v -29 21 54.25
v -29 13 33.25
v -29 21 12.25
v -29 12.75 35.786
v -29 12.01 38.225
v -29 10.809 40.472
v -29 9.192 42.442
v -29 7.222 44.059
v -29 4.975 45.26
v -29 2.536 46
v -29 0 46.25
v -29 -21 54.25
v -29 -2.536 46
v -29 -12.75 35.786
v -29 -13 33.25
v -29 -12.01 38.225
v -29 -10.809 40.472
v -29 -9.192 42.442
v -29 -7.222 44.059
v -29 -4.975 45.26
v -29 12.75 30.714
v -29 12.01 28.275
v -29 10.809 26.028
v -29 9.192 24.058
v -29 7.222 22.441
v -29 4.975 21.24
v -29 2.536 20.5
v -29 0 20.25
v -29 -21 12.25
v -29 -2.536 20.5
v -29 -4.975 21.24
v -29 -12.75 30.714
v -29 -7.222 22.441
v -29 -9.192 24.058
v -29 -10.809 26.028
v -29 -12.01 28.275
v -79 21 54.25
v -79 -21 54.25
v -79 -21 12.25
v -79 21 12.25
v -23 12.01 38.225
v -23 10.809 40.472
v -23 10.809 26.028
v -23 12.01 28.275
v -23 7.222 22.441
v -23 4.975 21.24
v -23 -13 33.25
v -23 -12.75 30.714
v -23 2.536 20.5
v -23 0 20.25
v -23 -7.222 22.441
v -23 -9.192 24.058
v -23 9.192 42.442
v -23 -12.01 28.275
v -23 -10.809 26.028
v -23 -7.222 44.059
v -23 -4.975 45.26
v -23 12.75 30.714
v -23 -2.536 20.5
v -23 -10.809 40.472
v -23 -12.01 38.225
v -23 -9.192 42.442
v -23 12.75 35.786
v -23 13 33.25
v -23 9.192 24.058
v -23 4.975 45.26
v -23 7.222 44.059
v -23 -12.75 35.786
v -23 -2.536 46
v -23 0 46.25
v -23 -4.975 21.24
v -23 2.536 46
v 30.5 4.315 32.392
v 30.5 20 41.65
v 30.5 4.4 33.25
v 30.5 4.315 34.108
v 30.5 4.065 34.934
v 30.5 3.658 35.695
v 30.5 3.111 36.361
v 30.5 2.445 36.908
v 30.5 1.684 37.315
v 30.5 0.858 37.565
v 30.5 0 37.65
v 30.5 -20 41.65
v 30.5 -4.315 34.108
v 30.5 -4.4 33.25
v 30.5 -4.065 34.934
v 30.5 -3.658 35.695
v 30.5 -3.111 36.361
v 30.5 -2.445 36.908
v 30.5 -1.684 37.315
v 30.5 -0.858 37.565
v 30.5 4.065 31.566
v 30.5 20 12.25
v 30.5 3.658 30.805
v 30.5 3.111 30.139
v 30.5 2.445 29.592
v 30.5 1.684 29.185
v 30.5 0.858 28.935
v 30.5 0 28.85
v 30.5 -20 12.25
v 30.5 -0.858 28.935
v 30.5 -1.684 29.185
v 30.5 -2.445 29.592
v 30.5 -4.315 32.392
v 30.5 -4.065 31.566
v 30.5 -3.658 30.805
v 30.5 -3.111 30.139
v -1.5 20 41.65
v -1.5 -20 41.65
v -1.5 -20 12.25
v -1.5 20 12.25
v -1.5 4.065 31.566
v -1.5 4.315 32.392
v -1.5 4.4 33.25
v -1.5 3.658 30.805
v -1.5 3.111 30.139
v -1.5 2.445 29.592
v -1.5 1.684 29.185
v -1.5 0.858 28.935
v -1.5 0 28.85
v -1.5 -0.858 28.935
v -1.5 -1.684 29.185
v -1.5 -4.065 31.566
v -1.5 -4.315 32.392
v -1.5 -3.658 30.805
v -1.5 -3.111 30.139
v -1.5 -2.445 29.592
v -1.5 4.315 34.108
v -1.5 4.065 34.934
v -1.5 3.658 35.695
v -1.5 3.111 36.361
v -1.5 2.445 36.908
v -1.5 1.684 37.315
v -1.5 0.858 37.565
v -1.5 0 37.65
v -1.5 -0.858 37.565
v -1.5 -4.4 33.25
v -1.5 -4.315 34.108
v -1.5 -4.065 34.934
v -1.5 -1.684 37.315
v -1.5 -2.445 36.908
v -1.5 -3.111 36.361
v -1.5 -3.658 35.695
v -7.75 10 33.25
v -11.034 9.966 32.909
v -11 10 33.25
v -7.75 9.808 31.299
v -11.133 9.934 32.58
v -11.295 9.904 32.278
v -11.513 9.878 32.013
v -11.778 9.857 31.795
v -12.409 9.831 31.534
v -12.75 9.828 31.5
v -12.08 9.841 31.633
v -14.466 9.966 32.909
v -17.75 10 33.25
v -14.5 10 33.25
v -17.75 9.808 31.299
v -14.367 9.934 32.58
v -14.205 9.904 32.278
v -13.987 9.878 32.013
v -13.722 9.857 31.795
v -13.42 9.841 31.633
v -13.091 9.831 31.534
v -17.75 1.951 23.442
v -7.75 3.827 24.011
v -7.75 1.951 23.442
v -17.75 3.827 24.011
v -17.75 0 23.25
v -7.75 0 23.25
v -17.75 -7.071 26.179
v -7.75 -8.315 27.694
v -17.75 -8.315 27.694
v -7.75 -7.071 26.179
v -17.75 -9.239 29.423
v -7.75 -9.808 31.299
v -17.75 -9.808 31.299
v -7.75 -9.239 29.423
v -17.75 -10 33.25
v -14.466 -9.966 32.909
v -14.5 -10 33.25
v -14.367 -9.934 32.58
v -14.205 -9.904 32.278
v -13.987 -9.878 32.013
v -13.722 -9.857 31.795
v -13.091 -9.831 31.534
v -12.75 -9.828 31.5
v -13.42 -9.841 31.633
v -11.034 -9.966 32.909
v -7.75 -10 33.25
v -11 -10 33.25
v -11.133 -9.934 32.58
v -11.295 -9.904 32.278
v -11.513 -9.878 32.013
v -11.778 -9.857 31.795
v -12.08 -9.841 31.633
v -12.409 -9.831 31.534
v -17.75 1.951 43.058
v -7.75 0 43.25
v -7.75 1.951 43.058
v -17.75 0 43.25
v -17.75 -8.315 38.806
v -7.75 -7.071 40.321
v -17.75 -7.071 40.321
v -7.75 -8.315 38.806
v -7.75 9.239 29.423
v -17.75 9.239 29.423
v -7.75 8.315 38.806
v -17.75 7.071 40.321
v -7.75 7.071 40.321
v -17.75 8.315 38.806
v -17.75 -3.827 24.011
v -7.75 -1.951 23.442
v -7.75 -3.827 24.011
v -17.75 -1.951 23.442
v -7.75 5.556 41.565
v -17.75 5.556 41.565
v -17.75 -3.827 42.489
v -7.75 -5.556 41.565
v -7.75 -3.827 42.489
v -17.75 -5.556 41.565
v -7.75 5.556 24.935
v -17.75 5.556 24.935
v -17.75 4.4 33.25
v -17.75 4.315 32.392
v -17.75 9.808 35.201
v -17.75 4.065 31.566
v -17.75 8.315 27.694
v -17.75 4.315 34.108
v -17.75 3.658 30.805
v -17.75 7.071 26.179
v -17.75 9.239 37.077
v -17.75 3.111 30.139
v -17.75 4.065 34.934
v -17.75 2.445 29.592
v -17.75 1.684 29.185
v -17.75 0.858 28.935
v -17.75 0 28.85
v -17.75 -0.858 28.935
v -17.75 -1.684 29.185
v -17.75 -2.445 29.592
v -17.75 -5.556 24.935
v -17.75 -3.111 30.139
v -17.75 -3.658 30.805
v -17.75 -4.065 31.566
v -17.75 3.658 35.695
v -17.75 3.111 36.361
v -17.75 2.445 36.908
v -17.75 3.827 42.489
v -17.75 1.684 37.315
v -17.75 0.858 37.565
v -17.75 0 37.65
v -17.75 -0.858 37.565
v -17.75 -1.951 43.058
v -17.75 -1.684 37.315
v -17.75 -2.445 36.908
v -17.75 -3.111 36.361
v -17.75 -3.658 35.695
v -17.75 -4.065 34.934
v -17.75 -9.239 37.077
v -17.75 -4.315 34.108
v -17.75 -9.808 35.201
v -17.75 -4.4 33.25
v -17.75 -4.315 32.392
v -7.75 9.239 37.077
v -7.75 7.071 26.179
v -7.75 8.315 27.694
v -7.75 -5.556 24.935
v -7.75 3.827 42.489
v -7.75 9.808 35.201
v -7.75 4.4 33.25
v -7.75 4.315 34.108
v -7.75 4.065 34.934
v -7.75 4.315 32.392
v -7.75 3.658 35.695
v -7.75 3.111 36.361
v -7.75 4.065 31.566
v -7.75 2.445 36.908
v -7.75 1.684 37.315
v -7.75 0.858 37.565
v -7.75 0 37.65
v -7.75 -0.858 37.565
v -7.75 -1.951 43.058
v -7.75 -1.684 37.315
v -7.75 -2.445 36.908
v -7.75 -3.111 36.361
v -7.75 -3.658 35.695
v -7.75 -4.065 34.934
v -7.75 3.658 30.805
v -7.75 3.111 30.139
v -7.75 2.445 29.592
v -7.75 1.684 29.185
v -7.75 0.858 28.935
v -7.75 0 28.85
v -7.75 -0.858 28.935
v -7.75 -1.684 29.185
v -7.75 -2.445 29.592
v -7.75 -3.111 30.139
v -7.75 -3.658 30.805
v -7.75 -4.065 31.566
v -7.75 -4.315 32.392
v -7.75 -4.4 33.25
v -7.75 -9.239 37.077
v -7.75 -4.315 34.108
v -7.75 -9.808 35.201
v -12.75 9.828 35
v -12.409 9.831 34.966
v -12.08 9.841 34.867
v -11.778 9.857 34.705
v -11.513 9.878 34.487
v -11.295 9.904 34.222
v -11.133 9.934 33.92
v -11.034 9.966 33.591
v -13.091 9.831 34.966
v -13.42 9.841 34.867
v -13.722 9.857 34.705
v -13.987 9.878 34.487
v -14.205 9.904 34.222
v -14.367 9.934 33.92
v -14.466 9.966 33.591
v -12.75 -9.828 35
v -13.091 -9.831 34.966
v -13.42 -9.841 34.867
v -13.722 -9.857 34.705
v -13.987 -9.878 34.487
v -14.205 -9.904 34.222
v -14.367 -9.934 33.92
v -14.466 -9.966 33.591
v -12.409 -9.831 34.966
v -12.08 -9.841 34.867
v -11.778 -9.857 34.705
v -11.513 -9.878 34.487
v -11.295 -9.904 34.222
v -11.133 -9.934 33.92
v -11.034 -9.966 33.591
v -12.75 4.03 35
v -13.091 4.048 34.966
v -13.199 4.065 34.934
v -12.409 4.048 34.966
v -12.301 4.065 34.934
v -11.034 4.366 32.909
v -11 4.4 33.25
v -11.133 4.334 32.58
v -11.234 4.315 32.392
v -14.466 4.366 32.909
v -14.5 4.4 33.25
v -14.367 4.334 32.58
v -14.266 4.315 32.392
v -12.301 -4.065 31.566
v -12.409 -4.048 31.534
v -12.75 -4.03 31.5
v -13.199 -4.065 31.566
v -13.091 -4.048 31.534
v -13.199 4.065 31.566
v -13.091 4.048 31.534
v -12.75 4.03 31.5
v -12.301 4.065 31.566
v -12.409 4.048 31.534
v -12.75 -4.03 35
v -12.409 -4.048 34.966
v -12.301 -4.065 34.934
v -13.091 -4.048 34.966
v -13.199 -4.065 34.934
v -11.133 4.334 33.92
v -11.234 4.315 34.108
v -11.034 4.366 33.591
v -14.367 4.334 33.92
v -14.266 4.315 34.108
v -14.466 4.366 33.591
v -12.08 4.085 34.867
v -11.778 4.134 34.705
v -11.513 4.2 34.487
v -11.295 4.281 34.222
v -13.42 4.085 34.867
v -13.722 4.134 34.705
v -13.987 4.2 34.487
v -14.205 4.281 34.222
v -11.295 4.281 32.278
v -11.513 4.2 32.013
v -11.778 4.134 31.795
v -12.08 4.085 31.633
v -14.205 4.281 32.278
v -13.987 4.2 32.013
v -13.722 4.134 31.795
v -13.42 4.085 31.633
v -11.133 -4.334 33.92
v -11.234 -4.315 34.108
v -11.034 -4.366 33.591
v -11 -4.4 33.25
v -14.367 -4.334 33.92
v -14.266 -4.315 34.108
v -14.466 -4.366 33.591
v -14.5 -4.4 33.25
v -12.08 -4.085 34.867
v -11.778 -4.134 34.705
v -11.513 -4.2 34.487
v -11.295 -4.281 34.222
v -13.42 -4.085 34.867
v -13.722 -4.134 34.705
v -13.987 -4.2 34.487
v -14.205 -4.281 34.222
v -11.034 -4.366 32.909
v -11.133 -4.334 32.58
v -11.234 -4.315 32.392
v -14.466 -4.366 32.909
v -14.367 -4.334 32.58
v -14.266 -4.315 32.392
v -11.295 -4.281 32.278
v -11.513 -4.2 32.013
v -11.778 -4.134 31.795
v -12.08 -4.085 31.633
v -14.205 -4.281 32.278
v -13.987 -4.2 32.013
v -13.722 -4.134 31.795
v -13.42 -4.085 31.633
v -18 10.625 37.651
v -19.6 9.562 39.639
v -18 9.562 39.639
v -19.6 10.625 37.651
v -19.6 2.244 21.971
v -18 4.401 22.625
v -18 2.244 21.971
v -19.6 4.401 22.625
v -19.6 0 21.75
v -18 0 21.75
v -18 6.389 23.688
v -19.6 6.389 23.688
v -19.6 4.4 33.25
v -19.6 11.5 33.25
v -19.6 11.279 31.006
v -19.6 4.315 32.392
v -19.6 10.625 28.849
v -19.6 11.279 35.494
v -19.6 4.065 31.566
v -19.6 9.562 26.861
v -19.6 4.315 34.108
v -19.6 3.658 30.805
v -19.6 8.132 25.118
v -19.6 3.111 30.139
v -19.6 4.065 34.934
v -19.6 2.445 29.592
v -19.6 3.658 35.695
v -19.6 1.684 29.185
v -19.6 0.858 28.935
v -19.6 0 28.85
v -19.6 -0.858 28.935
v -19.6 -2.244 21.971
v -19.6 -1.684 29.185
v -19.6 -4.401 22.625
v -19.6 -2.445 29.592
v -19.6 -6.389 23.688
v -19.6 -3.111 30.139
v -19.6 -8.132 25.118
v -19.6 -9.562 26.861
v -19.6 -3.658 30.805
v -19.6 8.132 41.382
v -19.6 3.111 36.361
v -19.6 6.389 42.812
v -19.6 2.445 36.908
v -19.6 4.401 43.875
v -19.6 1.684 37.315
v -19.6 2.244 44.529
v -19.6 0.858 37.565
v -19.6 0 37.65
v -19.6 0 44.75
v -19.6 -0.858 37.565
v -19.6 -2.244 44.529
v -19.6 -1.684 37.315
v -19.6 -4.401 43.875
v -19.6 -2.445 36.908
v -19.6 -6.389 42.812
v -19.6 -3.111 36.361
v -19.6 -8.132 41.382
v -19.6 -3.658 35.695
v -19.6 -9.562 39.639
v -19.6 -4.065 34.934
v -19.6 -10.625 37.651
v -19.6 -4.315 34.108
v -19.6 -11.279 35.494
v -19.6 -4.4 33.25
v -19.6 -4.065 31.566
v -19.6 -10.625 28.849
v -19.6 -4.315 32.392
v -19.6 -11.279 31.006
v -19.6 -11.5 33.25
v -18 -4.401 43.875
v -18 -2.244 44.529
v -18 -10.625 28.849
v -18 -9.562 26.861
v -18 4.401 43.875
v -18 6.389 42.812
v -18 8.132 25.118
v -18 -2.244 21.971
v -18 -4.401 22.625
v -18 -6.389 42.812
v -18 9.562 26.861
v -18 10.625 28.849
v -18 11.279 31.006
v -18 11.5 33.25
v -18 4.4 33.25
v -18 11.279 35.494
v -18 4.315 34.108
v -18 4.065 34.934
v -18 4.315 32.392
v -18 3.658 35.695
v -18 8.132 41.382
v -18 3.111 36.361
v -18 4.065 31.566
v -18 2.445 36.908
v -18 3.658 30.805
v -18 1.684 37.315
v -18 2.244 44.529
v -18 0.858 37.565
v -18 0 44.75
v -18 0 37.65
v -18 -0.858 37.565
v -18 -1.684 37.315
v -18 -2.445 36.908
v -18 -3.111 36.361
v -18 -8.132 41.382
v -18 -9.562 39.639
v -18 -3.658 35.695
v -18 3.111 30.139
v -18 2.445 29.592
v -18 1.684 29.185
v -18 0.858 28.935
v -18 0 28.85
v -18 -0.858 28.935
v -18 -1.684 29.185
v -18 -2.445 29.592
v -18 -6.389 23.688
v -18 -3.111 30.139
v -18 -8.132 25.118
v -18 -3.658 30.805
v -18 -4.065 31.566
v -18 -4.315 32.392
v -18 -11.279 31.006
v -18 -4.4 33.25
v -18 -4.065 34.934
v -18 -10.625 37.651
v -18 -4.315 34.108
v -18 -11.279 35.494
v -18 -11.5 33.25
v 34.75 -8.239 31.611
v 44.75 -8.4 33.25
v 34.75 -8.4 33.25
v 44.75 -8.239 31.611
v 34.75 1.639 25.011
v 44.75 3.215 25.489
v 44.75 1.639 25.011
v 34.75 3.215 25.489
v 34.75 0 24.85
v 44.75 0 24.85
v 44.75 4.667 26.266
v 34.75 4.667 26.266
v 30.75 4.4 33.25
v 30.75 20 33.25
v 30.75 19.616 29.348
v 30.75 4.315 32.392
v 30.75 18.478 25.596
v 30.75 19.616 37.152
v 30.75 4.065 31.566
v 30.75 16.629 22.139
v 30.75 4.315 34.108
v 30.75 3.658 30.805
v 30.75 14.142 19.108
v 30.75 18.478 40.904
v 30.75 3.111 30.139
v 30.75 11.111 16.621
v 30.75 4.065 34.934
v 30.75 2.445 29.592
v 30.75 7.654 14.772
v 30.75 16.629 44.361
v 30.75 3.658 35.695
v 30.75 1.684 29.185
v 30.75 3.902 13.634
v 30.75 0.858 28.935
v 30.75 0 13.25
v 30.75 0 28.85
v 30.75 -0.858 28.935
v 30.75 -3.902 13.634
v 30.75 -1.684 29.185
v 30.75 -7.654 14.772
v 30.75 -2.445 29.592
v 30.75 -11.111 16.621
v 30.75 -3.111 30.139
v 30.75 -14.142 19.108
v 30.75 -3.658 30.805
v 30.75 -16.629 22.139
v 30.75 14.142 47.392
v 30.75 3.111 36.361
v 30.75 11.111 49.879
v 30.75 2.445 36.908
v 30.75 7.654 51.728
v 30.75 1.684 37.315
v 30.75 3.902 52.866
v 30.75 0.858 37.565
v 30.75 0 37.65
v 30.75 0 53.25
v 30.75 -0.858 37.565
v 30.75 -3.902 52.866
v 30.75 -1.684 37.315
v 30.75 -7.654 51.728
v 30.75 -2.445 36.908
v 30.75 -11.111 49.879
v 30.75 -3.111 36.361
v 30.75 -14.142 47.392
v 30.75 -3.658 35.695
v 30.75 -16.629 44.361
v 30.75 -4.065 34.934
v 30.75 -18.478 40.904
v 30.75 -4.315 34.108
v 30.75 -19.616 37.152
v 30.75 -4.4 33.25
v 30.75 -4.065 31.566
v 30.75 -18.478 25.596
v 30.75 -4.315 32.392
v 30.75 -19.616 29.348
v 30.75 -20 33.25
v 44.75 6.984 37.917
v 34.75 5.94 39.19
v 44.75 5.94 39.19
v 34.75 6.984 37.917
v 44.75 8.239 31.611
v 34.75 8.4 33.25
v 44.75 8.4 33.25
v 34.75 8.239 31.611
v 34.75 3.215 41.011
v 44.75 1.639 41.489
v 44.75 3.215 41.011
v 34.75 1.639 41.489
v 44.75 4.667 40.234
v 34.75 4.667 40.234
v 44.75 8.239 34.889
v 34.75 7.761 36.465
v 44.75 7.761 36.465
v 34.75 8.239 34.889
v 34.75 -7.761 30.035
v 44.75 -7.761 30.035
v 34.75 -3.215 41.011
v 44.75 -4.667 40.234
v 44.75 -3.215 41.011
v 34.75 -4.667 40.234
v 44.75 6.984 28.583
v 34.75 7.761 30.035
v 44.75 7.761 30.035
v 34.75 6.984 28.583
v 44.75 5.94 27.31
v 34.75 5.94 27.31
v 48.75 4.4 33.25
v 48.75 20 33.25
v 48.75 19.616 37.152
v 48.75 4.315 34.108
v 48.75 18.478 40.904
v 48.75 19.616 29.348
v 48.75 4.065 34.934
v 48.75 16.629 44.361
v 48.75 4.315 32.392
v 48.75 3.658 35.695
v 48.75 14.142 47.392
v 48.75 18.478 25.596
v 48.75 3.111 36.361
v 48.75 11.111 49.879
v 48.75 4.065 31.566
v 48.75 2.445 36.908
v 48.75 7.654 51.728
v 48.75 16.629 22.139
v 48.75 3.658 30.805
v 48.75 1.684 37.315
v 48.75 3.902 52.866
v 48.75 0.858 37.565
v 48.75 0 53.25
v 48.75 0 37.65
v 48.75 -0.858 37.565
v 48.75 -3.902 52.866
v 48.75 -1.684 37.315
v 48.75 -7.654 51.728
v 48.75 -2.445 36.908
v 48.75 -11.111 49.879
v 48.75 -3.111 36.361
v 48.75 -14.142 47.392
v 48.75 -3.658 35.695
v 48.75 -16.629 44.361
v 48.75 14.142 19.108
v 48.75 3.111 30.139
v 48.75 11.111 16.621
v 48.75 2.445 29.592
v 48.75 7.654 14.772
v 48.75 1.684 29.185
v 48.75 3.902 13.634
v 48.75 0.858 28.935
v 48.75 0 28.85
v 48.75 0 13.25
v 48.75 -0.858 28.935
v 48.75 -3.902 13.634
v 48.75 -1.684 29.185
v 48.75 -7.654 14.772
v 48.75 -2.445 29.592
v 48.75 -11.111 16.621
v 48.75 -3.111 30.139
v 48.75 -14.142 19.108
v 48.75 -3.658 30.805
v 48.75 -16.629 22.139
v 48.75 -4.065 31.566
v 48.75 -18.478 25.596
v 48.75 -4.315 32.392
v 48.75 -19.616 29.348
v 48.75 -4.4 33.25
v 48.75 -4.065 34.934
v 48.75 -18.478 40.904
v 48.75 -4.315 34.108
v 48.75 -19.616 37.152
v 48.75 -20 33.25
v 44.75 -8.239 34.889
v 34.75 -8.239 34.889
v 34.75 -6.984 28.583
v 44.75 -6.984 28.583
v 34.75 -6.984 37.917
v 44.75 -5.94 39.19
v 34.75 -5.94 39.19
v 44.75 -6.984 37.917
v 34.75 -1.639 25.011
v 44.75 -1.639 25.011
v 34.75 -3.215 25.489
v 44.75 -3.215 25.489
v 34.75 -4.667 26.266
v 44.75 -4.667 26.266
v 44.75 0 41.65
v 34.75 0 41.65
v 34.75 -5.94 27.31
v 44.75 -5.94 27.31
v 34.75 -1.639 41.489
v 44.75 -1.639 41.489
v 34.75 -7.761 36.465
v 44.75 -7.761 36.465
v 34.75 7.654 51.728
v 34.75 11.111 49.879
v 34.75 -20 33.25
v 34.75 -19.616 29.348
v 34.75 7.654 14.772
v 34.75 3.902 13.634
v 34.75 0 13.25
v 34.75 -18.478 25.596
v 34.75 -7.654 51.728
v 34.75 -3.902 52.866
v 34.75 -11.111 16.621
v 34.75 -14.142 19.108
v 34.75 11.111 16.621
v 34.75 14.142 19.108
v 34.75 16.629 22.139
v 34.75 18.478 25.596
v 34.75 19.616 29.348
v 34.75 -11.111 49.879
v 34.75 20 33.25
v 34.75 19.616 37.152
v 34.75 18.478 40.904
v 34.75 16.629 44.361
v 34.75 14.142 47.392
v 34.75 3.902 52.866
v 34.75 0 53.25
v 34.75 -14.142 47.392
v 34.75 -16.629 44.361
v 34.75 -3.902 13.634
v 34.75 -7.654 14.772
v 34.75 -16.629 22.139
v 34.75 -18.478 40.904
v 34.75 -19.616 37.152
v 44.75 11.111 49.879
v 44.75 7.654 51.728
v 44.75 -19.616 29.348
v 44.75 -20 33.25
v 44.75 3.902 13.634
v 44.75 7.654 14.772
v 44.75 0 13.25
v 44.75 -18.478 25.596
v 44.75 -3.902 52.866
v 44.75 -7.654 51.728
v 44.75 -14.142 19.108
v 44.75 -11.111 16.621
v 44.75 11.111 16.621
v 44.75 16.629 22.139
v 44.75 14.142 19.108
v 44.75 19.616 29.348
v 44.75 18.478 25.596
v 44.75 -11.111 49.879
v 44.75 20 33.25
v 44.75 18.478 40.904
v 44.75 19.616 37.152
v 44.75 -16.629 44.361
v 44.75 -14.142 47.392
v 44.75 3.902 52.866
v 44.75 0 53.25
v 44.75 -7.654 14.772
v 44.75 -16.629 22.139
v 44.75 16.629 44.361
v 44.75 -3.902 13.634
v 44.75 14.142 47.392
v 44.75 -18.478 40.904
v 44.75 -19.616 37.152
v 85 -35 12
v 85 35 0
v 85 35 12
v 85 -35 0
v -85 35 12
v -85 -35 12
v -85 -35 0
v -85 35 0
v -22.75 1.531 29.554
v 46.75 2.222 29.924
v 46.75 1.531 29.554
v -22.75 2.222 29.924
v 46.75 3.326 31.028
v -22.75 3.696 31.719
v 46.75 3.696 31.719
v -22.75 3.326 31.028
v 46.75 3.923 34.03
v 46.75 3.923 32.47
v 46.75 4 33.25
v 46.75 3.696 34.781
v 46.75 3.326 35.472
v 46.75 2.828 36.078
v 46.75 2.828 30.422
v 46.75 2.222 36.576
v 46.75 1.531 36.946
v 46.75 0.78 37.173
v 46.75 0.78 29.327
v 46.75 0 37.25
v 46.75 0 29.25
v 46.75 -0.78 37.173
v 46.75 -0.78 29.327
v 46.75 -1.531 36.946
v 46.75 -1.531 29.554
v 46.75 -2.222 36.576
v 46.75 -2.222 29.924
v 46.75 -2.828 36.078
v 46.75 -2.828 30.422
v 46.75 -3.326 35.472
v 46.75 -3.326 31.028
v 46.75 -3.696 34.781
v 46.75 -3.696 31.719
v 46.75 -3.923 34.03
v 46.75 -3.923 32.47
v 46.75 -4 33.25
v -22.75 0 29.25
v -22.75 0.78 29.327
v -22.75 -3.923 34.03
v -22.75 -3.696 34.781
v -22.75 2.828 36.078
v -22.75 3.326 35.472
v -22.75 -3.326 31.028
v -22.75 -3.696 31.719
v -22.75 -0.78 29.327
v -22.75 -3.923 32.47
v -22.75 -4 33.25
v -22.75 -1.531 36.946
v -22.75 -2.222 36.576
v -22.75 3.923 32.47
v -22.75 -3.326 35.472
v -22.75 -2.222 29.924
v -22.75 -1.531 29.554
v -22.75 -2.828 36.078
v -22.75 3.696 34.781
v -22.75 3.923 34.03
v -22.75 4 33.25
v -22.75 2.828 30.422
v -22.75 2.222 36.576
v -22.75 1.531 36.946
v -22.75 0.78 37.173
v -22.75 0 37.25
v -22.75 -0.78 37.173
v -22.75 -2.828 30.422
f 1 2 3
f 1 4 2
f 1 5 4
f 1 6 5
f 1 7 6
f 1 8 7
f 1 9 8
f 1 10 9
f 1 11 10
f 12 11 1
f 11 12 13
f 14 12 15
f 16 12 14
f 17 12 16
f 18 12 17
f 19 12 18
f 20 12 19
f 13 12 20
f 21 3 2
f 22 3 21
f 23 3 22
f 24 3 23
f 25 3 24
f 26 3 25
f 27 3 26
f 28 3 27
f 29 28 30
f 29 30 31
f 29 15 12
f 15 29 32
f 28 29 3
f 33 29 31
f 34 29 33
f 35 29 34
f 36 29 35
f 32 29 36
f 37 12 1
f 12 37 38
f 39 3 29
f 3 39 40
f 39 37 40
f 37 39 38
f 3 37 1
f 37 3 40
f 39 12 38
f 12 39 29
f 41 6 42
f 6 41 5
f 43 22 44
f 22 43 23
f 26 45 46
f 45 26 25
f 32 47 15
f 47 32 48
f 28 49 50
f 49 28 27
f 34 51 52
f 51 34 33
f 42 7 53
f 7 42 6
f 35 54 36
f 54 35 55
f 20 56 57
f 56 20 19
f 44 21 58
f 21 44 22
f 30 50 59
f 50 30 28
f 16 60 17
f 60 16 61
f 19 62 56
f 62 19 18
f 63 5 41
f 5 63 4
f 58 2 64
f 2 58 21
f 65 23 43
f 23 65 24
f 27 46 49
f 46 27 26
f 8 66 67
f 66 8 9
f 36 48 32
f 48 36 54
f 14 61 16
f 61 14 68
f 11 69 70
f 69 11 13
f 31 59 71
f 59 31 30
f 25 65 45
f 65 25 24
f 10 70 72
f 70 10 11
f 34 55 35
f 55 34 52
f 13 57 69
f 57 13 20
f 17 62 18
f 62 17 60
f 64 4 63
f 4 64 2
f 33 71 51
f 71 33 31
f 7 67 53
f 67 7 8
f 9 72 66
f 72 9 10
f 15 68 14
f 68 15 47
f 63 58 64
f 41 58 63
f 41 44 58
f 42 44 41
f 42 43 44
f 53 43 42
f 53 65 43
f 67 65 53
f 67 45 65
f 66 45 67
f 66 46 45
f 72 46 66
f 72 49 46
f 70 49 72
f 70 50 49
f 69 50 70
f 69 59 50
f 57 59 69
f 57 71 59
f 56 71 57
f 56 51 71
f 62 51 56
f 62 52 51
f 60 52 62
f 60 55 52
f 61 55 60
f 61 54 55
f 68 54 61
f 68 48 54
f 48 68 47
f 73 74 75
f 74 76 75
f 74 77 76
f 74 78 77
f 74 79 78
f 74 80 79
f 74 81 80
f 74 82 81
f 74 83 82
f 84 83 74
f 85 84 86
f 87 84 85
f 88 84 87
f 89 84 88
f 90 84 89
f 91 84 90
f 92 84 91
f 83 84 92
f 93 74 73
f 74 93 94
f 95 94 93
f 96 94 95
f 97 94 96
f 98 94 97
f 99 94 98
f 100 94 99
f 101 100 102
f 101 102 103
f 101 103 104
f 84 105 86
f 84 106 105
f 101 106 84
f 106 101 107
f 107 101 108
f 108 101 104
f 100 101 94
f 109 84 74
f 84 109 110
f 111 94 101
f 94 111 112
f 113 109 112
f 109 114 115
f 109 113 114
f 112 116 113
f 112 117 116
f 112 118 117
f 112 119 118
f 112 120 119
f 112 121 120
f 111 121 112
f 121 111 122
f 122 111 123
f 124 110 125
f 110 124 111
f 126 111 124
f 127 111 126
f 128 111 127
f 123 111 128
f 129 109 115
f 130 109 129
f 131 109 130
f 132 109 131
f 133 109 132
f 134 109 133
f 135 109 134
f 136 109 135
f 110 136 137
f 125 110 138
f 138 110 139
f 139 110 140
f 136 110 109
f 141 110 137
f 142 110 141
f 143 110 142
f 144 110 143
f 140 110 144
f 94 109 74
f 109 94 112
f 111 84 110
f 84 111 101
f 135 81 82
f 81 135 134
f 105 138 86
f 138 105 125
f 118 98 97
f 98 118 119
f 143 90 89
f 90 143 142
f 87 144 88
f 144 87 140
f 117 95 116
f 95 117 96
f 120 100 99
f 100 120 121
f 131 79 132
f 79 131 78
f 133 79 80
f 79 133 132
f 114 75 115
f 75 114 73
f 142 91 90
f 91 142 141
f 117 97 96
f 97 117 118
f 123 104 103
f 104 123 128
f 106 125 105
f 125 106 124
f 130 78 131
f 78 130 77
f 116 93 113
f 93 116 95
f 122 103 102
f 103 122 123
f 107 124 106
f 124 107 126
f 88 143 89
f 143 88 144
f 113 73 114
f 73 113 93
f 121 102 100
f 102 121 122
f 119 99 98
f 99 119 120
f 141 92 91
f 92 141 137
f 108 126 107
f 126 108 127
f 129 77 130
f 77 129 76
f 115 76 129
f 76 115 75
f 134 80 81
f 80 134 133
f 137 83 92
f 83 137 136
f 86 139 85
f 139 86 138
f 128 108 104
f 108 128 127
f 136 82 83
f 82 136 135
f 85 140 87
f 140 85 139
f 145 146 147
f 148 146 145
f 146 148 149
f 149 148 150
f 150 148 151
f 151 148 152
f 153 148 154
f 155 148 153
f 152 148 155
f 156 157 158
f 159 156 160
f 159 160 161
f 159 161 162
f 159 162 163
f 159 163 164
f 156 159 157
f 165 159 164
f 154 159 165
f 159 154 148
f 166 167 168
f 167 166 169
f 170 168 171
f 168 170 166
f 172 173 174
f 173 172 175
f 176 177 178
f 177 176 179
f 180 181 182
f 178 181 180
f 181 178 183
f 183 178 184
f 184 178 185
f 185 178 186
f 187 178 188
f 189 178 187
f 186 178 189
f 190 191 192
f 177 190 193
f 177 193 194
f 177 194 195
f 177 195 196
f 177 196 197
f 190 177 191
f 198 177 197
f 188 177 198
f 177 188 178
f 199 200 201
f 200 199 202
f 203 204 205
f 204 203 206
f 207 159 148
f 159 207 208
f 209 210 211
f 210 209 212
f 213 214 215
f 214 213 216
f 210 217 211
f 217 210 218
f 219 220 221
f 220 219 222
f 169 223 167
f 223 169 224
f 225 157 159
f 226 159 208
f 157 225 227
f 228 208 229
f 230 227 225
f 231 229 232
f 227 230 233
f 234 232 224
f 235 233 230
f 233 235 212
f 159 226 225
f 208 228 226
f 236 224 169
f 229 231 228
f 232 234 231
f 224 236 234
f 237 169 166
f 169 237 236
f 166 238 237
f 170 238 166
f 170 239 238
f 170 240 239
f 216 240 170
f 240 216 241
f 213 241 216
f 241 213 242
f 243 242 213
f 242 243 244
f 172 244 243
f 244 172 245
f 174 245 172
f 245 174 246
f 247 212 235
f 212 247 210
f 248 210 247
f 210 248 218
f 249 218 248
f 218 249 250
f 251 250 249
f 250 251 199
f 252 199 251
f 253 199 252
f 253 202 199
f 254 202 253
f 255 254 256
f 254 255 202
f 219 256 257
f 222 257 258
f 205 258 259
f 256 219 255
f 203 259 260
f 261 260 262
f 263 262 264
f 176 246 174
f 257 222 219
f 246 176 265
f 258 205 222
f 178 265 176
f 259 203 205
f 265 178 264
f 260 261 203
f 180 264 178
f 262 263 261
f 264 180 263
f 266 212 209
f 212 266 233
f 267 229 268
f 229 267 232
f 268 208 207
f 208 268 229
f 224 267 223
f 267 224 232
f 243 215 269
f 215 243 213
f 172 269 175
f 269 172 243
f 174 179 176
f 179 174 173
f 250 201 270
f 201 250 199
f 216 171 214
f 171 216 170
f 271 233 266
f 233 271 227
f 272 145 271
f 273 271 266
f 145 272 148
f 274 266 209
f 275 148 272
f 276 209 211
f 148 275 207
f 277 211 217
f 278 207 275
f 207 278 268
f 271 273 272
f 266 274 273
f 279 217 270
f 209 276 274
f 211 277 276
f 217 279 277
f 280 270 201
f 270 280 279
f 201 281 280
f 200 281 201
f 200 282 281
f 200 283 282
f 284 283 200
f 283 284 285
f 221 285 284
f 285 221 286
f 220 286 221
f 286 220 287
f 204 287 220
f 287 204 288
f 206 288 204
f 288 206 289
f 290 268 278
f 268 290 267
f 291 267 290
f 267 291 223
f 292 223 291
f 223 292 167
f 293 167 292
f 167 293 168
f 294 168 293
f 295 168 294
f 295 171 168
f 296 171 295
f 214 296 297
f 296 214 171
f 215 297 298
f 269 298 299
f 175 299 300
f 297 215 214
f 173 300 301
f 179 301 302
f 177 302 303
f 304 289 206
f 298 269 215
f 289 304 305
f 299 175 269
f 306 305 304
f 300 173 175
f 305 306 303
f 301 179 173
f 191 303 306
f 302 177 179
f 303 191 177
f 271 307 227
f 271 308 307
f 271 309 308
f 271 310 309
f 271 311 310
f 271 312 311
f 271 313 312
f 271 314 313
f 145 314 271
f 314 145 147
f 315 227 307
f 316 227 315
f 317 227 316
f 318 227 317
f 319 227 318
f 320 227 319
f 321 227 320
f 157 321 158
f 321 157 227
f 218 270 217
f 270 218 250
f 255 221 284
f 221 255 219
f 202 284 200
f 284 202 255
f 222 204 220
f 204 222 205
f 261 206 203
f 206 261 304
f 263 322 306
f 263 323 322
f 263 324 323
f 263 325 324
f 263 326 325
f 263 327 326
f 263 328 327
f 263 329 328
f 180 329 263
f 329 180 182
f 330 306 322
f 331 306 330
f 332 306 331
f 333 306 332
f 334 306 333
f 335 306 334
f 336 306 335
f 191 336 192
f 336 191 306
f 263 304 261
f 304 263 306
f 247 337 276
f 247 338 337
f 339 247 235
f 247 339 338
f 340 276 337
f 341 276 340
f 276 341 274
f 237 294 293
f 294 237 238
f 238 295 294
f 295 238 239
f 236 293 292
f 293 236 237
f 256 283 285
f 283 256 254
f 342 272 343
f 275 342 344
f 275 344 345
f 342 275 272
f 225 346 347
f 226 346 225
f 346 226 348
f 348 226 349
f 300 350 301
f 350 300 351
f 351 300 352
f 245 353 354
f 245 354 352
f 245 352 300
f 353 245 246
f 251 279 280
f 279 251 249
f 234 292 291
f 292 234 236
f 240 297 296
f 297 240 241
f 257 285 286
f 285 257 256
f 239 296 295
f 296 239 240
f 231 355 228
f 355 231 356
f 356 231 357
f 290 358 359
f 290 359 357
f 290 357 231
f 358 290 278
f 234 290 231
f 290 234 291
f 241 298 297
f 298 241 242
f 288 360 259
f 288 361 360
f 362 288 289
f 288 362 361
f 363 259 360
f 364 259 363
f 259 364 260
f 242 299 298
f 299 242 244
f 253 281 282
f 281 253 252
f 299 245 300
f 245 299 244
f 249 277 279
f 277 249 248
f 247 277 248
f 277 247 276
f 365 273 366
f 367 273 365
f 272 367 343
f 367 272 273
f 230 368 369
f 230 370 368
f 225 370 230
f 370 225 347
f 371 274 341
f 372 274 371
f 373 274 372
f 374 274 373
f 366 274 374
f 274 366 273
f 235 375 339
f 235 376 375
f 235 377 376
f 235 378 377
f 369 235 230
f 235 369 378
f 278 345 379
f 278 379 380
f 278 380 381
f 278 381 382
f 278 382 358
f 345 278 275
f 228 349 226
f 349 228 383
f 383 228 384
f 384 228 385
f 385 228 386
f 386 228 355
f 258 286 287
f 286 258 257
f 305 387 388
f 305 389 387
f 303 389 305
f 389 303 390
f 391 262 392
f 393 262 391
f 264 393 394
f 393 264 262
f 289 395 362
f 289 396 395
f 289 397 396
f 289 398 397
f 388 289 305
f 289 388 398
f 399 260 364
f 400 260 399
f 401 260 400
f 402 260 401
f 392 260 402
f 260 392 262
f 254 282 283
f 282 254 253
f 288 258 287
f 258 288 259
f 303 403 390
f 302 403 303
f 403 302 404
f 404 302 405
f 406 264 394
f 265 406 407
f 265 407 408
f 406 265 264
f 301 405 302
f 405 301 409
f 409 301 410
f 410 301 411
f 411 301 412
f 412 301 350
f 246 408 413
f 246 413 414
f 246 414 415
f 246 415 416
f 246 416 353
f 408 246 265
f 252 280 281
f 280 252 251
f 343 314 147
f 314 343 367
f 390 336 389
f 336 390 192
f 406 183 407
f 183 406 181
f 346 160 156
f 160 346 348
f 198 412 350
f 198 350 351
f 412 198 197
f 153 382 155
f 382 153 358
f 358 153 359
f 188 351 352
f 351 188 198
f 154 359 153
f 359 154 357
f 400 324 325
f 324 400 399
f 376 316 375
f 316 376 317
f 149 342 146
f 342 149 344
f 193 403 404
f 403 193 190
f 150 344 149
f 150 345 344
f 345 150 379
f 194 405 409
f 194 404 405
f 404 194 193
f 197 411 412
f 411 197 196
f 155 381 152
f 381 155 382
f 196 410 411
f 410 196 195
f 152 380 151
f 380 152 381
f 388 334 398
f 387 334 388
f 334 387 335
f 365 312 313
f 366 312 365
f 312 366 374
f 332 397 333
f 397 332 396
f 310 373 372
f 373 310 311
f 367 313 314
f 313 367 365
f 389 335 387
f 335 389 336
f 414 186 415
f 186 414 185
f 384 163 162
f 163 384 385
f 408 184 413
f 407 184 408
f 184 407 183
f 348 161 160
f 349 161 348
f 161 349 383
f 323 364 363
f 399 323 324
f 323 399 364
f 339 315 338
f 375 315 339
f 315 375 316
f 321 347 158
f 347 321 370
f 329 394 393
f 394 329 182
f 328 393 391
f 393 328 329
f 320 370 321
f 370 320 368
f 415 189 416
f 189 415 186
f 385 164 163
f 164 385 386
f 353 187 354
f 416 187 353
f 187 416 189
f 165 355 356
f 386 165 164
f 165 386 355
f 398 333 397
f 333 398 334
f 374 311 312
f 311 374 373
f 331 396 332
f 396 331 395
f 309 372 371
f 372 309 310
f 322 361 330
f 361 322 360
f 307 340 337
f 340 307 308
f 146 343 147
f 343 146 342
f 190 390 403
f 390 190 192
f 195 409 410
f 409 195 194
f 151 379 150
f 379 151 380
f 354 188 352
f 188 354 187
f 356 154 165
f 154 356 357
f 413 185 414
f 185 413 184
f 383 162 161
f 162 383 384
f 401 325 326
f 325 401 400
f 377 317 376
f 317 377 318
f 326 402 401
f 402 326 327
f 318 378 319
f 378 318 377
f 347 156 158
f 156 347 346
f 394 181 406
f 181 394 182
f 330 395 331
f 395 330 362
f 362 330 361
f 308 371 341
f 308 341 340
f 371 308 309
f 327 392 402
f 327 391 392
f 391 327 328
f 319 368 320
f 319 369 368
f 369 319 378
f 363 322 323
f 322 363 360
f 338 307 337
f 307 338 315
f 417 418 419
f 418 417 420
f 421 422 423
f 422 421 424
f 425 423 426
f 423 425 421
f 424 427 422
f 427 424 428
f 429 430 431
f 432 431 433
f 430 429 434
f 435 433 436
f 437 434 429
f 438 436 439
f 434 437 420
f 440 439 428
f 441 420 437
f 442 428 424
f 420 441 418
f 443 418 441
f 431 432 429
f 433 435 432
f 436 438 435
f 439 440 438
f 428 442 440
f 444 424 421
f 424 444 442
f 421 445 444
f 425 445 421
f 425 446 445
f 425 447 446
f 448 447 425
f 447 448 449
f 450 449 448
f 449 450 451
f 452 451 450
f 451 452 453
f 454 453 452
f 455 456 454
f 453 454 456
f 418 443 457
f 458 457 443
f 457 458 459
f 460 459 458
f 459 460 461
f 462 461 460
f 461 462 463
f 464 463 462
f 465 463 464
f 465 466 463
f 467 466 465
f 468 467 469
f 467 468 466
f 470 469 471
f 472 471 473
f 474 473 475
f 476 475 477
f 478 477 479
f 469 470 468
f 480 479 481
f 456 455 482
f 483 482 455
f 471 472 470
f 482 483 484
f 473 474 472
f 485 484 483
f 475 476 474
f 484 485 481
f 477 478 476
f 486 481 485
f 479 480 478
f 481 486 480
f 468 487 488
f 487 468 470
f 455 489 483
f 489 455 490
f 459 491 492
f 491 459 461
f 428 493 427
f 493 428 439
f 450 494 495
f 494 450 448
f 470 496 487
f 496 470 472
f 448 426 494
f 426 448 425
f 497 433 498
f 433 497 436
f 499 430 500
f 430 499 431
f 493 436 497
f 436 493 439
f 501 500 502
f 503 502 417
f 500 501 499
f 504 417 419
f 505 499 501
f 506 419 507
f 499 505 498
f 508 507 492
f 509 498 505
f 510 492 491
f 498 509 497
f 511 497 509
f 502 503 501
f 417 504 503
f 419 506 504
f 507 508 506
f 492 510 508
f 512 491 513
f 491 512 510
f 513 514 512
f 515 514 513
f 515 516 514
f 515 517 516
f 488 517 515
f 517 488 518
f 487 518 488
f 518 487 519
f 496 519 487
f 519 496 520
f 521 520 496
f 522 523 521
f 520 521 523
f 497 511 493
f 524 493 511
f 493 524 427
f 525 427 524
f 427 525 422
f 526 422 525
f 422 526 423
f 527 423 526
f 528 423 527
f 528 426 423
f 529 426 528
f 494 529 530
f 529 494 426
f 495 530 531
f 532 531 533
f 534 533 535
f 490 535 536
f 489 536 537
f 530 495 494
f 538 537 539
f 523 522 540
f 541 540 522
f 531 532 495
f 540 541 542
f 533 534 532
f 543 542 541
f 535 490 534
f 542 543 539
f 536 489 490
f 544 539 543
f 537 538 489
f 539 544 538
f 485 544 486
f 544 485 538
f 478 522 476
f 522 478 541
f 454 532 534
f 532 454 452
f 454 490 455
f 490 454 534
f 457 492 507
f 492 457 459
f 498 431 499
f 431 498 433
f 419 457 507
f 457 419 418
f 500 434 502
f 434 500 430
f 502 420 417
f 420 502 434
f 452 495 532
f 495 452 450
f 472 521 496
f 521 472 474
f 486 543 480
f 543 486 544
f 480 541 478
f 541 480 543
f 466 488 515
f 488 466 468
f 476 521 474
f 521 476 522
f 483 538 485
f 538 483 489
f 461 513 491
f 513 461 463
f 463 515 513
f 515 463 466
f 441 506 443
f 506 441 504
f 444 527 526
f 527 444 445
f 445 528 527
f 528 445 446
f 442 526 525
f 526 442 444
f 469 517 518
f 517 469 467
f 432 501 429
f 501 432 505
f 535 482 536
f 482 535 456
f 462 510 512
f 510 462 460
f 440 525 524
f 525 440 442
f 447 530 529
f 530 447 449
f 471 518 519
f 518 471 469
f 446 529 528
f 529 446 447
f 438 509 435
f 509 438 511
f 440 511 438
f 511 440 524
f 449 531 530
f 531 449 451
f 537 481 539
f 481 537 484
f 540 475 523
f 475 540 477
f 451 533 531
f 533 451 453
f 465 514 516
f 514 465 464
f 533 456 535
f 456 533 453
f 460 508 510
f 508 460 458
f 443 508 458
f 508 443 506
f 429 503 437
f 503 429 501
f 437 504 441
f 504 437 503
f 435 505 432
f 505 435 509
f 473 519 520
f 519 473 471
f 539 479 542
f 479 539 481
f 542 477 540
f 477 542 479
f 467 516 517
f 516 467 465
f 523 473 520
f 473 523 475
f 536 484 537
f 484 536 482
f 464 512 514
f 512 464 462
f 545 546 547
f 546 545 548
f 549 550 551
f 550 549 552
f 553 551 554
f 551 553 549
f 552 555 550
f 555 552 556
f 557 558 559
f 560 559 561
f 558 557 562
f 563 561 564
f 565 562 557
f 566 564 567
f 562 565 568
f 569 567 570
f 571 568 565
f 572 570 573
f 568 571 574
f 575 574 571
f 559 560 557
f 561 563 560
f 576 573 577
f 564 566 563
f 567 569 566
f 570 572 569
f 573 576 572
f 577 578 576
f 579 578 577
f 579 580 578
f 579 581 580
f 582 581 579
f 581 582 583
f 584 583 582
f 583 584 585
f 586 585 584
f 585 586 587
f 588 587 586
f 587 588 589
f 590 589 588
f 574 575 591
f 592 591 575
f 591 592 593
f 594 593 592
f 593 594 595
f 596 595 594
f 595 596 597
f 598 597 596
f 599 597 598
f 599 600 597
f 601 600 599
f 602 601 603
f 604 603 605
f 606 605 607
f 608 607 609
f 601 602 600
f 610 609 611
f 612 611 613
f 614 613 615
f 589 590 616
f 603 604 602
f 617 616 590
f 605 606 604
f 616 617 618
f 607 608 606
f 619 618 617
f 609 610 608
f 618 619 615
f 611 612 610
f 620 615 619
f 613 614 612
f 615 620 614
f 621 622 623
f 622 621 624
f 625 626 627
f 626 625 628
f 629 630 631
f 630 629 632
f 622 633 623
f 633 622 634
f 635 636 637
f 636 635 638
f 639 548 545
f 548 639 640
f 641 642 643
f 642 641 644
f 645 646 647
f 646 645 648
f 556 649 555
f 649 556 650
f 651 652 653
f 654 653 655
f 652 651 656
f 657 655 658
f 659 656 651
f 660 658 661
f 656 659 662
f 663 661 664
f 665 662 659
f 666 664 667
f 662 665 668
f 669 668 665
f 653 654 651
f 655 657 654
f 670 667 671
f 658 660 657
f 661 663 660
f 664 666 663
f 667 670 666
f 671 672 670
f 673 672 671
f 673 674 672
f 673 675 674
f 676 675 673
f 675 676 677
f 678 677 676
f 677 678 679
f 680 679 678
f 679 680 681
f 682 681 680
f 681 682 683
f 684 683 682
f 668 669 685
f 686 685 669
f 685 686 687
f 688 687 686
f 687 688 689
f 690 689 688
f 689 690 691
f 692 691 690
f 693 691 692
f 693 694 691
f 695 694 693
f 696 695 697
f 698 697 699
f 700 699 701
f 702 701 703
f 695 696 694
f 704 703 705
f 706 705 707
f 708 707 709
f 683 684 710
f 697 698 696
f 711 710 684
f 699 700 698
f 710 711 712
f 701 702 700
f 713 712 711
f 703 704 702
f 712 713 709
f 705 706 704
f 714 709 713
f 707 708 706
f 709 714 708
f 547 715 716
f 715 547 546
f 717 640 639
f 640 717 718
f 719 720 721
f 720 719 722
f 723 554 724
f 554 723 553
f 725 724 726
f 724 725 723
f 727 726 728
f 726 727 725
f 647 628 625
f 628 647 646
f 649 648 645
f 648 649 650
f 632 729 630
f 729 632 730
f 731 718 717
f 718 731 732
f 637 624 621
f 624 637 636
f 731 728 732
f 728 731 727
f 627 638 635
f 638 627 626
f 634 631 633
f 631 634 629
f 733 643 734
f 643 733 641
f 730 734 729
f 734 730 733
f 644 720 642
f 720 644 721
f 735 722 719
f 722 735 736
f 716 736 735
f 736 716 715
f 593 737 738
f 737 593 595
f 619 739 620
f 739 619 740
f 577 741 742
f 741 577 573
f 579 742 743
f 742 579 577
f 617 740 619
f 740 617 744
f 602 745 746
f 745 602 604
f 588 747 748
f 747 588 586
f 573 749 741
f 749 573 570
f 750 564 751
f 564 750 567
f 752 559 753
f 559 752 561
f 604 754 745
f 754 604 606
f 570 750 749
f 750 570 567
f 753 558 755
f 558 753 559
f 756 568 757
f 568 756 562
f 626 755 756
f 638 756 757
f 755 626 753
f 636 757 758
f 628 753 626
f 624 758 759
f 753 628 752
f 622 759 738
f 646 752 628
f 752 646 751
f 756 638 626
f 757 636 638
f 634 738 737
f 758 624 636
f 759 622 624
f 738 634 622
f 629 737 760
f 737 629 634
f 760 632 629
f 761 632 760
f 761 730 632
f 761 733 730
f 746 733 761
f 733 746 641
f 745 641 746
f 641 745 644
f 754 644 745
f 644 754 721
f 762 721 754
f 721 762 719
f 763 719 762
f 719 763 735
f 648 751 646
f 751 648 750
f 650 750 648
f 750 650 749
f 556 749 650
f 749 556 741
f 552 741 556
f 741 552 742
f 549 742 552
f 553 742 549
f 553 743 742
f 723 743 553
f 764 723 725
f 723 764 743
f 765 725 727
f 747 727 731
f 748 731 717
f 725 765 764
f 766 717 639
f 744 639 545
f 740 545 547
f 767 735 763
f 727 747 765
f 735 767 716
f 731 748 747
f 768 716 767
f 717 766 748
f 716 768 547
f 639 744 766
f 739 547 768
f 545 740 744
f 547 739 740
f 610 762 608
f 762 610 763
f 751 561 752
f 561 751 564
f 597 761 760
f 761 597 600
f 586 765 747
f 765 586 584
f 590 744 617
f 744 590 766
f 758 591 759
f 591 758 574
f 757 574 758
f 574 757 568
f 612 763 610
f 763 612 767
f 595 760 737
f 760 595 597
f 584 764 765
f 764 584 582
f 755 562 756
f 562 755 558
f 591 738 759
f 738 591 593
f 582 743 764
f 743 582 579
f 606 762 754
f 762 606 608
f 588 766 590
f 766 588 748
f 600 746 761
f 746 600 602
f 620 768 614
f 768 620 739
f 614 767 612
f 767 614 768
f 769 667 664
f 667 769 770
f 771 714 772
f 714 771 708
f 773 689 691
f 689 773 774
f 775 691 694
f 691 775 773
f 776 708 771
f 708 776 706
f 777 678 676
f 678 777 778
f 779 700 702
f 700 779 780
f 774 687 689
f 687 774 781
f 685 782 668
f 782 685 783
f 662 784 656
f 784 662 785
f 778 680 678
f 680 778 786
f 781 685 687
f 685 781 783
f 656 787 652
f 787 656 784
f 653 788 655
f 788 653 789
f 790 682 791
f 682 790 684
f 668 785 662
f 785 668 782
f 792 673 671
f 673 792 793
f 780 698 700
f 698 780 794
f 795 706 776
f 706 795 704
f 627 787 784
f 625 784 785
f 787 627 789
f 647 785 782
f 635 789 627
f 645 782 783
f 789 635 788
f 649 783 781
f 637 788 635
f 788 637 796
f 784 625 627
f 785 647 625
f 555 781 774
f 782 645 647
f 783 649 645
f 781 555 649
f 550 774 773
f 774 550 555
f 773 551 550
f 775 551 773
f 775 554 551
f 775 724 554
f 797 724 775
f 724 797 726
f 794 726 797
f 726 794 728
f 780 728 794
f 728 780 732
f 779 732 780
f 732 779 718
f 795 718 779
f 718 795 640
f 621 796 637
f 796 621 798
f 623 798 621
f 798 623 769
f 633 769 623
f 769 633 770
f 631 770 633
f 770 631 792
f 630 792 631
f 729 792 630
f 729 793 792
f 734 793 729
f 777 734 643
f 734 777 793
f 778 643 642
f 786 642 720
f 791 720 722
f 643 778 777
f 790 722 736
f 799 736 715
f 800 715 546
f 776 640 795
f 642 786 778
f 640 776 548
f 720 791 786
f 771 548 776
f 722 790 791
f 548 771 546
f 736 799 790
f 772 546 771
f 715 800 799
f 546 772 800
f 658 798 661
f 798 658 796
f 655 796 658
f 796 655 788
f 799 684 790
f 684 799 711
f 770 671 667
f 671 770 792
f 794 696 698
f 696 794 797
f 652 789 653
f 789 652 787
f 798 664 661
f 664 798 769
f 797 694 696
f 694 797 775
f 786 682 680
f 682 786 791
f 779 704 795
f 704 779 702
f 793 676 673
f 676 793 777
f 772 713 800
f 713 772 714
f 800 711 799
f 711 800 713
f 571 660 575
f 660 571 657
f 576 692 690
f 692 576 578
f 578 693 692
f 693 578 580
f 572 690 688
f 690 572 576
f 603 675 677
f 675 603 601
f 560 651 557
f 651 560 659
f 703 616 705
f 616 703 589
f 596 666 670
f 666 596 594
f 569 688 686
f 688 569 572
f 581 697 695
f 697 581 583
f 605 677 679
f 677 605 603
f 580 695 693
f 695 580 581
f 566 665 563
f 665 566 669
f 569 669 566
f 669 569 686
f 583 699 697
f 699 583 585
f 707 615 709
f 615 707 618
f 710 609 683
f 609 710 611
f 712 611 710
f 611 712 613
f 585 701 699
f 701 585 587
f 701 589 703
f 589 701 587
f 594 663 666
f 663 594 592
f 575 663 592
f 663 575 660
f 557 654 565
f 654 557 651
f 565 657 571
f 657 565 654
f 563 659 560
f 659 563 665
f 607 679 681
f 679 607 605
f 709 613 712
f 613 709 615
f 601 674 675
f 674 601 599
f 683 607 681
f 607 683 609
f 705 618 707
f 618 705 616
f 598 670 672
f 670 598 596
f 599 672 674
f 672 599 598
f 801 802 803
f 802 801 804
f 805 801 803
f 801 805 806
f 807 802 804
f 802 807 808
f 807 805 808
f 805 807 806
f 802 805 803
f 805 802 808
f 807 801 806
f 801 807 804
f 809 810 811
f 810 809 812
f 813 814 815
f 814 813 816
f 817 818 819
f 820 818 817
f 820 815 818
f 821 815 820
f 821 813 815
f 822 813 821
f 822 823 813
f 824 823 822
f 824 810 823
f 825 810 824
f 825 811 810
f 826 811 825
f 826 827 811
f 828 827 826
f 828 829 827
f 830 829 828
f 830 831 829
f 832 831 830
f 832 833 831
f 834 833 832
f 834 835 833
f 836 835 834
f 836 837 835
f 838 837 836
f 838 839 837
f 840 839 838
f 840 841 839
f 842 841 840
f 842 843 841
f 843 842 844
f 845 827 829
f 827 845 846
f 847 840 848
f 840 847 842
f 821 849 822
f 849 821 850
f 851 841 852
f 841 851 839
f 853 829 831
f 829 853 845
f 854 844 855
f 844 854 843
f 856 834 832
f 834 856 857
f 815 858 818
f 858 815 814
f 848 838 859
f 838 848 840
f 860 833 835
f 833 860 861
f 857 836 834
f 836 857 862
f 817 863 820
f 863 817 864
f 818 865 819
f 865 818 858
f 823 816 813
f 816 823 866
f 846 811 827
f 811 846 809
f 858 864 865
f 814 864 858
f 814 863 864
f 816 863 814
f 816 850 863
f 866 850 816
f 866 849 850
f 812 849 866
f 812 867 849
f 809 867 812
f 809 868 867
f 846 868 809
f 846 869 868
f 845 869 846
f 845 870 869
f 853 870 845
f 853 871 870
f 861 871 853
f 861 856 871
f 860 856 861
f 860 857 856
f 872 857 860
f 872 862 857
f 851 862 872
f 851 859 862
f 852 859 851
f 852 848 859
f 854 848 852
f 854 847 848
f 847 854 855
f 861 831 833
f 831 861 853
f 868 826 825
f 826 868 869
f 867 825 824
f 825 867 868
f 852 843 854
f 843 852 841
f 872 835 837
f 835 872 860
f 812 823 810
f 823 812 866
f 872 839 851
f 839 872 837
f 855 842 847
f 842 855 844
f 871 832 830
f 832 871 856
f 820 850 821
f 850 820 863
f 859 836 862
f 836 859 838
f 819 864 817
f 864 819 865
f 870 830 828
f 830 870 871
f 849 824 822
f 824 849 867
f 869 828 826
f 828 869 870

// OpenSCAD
$fn = 32;

// ------------------------------------------------------------------------
// Motor drive station: motor 50 x 42 mm, shaft d8, pulley d40
// Every part is its own module, assembly() places every instance.
// ------------------------------------------------------------------------

// --- part 1 ---
module station_bed() {
  difference() {
    translate([-85, -35, 0]) cube([170, 70, 12]);
  }
}

// --- part 2 ---
module drive_motor() {
  union() {
    translate([-25, -21, 0]) cube([50, 42, 42]);
    translate([28, 0, 21]) rotate([0, 90, 0]) cylinder(h = 6, d = 26, center = true);
  }
}

// --- part 3 ---
module pillow_block() {
  difference() {
    translate([-16, -20, 0]) cube([32, 40, 29.4]);
    translate([0, 0, 21]) rotate([0, 90, 0]) cylinder(h = 34, d = 8.8, center = true);
  }
}

// --- part 4 ---
module drive_shaft() {
  translate([0, 0, -34.75]) cylinder(h = 69.5, d = 8);
}

// --- part 5 ---
module shaft_collar() {
  difference() {
    cylinder(h = 10, d = 20);
    translate([0, 0, -1]) cylinder(h = 12, d = 8.8);
    translate([0, 0, 5]) rotate([90, 0, 0]) cylinder(h = 22, d = 3.5, center = true);
  }
}

// --- part 6 ---
module collar_washer() {
  difference() {
      translate([0, 0, 0]) cylinder(h = 1.6, d = 23);
      translate([0, 0, -1]) cylinder(h = 3.6, d = 8.8);
    }
}

// --- part 7 ---
module drive_pulley() {
  difference() {
    union() {
      cylinder(h = 18, d = 16.8);
      cylinder(h = 4, d = 40);
      translate([0, 0, 14]) cylinder(h = 4, d = 40);
    }
    translate([0, 0, -1]) cylinder(h = 20, d = 8.8);
  }
}

// --- assembly ---
module assembly() {
  color([0.80, 0.24, 0.20]) translate([0, 0, 0]) rotate([0, 0, 0]) station_bed();
  color([0.20, 0.45, 0.75]) translate([-54, 0, 12.25]) rotate([0, 0, 0]) drive_motor();
  color([0.25, 0.62, 0.32]) translate([14.5, 0, 12.25]) rotate([0, 0, 0]) pillow_block();
  color([0.92, 0.70, 0.18]) translate([12, 0, 33.25]) rotate([0, 90, 0]) drive_shaft();
  color([0.58, 0.35, 0.70]) translate([-17.75, 0, 33.25]) rotate([0, 90, 0]) shaft_collar();
  color([0.16, 0.66, 0.66]) translate([-19.6, 0, 33.25]) rotate([0, 90, 0]) collar_washer();
  color([0.85, 0.48, 0.18]) translate([30.75, 0, 33.25]) rotate([0, 90, 0]) drive_pulley();
}

assembly();
